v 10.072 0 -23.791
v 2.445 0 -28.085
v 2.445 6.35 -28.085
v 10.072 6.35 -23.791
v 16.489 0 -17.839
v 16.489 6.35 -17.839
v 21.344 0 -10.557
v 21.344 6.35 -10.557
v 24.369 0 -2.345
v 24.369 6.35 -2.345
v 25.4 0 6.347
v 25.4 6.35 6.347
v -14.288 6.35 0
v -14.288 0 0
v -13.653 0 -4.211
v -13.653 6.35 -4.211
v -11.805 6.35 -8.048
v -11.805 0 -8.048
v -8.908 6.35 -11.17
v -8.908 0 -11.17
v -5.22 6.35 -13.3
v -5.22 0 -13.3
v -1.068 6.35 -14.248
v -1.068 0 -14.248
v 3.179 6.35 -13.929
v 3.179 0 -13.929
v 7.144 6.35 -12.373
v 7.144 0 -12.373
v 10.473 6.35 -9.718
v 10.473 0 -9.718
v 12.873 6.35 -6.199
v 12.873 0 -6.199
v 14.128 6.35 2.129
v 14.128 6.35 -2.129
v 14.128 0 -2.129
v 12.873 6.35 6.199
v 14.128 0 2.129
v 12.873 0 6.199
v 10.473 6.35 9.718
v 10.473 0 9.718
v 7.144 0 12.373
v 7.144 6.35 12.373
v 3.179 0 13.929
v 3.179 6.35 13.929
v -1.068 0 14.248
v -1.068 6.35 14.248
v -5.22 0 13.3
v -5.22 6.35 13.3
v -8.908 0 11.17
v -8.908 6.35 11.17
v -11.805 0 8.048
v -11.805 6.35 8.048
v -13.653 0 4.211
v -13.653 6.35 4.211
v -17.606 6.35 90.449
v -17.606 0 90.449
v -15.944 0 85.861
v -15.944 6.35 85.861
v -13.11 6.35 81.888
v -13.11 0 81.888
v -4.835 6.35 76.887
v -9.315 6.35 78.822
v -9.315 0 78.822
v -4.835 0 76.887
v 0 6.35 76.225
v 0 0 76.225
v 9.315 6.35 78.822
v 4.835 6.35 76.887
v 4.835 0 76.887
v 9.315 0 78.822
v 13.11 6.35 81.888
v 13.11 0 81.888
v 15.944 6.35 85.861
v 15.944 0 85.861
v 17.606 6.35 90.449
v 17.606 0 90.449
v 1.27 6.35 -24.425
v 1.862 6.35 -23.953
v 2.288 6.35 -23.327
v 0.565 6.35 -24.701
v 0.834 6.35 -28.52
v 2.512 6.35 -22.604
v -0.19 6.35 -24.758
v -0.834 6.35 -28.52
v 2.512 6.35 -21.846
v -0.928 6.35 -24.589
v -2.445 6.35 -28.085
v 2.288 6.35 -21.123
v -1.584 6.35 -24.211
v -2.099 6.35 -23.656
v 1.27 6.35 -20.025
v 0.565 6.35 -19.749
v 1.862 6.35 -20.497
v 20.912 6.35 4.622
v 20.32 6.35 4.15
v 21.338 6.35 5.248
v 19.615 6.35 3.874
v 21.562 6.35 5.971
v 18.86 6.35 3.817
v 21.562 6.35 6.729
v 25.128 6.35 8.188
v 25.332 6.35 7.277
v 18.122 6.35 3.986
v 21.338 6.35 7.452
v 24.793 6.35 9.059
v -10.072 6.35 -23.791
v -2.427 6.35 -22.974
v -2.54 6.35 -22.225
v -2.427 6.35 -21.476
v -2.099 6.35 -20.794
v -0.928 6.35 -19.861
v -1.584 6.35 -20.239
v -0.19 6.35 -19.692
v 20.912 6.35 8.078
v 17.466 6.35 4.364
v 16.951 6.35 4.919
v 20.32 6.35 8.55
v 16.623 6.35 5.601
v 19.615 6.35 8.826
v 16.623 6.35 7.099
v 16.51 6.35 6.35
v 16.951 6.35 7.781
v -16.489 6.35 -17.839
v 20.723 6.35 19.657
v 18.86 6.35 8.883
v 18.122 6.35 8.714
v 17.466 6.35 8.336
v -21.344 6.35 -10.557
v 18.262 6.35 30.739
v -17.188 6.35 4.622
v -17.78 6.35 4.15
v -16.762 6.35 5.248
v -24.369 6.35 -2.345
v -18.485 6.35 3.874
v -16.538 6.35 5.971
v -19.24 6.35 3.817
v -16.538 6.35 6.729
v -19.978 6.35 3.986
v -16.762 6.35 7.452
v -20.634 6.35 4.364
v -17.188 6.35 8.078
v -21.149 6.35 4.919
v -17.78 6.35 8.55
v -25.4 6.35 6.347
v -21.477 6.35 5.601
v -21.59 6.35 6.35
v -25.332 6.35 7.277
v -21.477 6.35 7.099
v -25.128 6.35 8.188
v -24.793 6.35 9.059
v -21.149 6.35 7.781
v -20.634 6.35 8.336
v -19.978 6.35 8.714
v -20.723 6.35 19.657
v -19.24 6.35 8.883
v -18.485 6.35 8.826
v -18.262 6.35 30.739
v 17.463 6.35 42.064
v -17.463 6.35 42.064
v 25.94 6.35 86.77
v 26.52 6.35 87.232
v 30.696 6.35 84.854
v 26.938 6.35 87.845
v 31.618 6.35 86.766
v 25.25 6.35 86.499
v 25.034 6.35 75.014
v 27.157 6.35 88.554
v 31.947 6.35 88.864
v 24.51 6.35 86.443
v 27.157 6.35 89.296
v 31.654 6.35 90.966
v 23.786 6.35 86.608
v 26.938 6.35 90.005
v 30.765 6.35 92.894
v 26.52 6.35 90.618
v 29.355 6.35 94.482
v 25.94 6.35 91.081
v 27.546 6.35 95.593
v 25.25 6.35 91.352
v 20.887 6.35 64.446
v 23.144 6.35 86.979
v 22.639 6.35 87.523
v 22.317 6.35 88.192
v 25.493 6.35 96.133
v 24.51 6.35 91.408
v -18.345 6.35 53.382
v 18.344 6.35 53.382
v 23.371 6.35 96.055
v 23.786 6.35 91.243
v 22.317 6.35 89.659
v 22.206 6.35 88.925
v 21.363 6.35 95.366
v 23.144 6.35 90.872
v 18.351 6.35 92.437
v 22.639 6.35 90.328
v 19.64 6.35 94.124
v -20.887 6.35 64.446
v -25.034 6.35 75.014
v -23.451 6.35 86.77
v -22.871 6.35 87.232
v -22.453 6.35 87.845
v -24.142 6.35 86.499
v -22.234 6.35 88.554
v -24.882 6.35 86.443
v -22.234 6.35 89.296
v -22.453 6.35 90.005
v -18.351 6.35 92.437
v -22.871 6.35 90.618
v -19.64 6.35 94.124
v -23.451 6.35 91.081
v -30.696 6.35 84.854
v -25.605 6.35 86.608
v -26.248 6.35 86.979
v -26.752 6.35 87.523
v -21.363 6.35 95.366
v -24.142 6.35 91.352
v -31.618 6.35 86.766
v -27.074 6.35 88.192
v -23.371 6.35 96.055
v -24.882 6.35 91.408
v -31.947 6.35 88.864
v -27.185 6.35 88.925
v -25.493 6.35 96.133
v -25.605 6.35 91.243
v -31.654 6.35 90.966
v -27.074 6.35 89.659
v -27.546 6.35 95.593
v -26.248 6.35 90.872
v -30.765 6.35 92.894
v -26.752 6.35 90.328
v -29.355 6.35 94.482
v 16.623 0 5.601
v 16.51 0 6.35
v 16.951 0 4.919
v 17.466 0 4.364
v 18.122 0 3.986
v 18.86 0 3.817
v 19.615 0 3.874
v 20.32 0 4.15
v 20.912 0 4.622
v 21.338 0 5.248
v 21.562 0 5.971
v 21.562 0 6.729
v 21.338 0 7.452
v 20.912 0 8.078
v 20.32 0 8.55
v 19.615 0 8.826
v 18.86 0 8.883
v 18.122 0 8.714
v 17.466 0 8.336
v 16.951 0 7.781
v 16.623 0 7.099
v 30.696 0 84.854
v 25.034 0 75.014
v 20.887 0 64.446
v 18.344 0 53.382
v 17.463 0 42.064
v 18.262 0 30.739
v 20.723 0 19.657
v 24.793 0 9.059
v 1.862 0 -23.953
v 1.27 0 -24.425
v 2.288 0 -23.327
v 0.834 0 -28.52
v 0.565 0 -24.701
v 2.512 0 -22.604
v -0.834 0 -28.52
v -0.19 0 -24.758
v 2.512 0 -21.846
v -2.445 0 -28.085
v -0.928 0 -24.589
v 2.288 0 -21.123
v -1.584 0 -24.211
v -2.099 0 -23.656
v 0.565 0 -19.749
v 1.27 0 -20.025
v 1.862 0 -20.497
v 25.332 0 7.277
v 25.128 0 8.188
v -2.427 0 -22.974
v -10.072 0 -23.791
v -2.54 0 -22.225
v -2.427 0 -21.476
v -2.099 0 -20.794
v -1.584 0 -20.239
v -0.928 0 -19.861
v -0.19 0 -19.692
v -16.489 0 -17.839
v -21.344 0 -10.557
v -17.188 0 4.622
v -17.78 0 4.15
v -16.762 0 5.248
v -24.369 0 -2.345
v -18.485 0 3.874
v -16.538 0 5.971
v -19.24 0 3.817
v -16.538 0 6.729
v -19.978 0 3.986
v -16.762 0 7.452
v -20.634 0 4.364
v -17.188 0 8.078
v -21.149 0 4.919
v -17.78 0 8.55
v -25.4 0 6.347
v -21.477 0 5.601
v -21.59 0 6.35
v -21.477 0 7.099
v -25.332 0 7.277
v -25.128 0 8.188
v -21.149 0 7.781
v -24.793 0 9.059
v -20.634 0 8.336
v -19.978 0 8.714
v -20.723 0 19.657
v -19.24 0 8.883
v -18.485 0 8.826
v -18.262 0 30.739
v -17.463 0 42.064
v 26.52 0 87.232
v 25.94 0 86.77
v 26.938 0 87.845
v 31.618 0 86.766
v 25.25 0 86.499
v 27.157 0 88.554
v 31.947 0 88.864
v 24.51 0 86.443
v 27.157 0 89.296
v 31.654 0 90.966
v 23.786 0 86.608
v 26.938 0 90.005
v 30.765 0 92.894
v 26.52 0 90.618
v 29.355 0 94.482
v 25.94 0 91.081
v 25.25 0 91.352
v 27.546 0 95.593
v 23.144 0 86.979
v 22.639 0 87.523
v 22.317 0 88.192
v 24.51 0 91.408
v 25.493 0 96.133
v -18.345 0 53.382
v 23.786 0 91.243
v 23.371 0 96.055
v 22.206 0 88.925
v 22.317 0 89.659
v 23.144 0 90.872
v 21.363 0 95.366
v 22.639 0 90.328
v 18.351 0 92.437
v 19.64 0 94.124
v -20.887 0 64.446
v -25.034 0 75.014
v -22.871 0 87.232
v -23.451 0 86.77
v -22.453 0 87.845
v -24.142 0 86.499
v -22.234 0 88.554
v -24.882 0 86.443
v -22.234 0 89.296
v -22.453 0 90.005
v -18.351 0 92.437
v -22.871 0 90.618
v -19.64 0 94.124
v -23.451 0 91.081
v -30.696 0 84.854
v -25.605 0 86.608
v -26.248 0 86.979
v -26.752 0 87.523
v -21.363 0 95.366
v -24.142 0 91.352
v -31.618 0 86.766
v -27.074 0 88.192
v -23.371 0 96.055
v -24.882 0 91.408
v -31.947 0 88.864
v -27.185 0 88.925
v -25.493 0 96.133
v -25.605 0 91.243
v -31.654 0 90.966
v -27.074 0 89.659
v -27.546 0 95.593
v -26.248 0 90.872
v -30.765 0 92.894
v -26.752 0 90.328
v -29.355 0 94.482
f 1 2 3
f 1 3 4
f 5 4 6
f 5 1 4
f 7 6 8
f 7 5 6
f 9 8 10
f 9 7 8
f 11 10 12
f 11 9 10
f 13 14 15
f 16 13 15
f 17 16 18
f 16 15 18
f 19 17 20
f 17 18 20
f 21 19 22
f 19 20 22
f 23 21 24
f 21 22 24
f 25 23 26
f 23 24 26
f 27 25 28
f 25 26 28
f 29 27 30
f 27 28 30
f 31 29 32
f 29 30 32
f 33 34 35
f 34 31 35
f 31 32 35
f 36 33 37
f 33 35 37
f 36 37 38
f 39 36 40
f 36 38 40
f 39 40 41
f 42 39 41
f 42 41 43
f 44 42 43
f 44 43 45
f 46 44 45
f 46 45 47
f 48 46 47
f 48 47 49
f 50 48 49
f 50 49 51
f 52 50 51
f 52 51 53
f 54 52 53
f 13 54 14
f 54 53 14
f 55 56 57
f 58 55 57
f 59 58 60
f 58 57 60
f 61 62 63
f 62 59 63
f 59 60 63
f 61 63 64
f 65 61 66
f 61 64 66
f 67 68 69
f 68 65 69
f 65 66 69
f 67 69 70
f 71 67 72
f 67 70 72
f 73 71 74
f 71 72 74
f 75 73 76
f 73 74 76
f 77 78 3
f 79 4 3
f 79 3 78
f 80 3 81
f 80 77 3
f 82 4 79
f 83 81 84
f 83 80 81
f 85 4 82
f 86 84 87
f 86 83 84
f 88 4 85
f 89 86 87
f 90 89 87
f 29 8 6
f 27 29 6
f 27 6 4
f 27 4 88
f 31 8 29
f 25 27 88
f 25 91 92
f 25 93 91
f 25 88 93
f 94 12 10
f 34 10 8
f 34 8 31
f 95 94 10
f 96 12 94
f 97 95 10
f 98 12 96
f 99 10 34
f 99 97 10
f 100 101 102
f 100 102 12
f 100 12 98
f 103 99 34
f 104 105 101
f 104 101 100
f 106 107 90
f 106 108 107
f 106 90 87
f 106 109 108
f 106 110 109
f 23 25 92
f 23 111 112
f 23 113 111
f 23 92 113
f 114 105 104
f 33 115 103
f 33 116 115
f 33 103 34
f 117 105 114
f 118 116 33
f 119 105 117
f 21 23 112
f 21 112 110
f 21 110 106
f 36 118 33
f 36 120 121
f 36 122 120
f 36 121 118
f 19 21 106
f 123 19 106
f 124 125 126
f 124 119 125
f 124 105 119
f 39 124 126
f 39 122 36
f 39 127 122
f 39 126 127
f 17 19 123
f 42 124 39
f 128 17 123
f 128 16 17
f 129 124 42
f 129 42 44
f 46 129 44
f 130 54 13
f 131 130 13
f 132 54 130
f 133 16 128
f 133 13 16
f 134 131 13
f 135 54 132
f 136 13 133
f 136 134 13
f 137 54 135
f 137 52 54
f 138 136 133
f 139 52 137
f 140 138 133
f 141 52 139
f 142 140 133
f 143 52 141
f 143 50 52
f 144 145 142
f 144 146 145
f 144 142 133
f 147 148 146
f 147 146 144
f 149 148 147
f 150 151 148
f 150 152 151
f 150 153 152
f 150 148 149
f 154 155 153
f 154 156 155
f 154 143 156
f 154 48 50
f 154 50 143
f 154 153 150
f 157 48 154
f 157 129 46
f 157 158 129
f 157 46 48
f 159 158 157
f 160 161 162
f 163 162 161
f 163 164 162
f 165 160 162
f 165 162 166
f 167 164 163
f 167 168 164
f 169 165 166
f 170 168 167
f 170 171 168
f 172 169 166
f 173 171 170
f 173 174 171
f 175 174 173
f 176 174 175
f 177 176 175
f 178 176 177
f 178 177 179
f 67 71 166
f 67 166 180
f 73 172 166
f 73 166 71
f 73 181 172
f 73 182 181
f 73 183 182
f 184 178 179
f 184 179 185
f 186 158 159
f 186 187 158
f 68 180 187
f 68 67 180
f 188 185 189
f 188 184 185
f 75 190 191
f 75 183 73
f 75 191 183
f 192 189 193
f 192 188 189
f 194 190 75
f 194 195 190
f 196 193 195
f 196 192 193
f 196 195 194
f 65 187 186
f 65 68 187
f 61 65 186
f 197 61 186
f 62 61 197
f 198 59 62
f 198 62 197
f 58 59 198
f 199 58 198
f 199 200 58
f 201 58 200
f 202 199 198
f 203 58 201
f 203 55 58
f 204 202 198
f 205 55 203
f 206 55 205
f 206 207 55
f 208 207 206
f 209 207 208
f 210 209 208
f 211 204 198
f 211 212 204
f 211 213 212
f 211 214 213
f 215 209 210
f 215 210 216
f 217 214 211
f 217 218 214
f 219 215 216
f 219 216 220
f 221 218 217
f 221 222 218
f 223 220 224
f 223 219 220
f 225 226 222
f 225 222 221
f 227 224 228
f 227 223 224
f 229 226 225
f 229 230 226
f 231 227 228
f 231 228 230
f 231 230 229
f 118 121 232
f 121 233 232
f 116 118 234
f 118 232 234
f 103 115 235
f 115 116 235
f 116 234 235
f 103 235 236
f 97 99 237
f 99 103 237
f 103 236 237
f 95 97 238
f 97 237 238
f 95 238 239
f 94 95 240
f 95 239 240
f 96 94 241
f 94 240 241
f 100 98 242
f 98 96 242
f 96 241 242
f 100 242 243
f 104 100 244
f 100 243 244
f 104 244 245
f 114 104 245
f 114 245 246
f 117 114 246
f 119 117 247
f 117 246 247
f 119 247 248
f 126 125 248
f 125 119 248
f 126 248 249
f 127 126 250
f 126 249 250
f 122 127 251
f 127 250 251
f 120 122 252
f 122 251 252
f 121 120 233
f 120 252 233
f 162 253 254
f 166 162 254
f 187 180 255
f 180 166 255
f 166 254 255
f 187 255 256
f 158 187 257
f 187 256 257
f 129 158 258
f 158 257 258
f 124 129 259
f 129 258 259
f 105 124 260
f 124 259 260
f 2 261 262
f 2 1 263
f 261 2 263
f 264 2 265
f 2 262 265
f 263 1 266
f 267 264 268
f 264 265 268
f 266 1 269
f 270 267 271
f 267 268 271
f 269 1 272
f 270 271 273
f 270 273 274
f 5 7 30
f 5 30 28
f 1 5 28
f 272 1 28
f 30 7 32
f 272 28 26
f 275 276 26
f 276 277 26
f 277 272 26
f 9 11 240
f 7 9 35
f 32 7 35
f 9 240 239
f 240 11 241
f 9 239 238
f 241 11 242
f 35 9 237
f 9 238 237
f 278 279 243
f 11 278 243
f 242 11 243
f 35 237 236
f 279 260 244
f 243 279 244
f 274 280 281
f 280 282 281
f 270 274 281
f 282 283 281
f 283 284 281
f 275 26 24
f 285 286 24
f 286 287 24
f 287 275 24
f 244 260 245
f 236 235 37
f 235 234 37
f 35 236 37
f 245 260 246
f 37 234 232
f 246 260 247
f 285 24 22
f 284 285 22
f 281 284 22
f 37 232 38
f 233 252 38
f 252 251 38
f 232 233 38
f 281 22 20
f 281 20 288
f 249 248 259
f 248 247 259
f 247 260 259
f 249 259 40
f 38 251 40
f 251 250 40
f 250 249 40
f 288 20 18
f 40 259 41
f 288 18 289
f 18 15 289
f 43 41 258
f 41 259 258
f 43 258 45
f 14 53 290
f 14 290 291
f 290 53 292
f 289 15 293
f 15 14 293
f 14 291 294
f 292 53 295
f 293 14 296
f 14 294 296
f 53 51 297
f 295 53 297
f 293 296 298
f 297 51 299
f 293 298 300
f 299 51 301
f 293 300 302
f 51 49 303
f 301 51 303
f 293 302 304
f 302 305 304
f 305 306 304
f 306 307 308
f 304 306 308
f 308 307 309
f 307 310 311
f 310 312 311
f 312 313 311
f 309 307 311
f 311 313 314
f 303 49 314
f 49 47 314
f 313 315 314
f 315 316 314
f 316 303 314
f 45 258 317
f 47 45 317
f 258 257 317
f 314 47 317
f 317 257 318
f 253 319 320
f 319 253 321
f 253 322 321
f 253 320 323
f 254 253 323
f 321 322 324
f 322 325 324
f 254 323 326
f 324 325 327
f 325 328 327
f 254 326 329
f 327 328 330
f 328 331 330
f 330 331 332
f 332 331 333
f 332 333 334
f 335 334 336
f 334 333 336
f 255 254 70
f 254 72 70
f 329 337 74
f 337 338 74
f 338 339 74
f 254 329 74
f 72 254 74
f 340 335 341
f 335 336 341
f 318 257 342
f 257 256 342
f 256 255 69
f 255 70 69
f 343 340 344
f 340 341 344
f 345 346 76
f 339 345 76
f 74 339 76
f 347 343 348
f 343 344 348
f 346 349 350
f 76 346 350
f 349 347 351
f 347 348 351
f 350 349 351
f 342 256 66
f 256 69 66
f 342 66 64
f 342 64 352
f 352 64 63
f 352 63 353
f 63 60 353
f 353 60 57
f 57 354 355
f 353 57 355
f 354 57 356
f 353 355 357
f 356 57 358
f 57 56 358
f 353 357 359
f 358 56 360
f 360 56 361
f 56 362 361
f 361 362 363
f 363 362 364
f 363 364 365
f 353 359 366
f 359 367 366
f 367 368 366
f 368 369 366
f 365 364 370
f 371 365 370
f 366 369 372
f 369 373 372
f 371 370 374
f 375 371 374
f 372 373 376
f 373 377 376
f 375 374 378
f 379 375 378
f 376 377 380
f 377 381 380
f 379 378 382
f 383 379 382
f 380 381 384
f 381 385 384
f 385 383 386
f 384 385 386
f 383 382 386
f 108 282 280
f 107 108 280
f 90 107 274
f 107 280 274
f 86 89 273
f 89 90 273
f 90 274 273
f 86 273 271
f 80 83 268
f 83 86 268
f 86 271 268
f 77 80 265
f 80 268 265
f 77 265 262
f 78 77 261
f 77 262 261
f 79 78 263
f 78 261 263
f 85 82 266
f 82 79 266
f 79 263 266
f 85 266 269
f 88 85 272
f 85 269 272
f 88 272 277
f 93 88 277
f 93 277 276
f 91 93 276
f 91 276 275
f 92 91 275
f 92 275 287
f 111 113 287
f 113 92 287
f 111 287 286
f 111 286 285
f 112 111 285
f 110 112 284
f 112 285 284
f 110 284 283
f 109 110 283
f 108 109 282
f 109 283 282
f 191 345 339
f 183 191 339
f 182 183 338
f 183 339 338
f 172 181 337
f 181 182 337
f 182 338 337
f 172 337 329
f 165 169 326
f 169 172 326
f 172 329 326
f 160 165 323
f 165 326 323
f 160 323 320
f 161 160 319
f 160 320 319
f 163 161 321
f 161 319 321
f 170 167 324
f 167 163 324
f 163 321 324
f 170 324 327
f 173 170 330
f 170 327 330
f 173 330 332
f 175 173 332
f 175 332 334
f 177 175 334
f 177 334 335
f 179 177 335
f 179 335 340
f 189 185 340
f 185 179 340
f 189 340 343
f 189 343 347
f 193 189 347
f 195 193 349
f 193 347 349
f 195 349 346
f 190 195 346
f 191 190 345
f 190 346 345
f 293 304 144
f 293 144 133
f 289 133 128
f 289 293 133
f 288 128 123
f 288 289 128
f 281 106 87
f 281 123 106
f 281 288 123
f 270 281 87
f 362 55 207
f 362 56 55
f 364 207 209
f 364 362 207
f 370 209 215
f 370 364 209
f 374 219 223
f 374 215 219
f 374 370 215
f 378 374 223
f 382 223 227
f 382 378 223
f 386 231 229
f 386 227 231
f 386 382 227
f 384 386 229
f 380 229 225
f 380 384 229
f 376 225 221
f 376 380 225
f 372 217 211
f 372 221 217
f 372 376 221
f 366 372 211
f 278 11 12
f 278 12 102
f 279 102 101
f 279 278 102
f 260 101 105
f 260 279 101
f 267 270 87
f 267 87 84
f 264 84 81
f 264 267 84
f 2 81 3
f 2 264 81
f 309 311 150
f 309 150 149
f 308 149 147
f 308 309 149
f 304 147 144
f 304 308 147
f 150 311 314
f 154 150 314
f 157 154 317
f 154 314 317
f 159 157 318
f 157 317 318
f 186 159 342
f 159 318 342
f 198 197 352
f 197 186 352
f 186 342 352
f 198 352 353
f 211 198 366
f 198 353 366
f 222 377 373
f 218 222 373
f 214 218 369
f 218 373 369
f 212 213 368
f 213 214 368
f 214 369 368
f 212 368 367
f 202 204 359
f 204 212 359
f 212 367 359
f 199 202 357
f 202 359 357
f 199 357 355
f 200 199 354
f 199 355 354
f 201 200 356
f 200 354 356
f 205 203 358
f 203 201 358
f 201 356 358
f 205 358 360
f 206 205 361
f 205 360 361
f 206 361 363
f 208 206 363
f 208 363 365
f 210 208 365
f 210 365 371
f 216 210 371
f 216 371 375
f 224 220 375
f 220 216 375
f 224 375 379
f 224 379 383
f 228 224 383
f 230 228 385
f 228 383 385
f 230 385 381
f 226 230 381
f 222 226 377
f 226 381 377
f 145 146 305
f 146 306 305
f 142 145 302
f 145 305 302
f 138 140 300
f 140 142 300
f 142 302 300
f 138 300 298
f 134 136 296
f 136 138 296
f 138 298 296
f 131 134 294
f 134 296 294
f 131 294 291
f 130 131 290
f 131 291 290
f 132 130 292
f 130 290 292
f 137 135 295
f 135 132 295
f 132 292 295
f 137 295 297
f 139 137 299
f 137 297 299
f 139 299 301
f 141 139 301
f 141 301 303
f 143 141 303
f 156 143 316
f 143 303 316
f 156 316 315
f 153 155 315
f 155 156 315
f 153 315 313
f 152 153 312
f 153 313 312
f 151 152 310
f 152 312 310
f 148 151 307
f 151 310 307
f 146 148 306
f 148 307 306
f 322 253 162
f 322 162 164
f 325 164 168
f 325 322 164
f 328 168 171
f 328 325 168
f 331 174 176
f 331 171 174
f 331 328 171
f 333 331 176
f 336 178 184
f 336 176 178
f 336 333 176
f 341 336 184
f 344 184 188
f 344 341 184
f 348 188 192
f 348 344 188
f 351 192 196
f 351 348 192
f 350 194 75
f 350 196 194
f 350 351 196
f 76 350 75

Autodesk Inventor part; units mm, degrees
ref_plane "YZ Plane" through (0, 0, 0) normal (1, 0, 0) x (0, 1, 0)
ref_plane "XZ Plane" through (0, 0, 0) normal (0, 1, 0) x (-1, 0, 0)
ref_plane "XY Plane" through (0, 0, 0) normal (0, 0, 1) x (1, 0, 0)
sketch "Sketch1" plane through (0, 0, 0) normal (0, 1, 0) x (-1, 0, 0)
  circle A0 centre (0, 0) radius 14.2875
  line L0 (143.7805, 15.875) -> (-143.7805, 15.875) construction
  line L1 (0, 0) -> (0, 15.875) construction
  line L2 (0, 15.875) -> (0, 88.9254) construction
  line L3 (24.6957, 88.9254) -> (-24.6957, 88.9254) construction
  line L4 (0, 113.6211) -> (0, 64.2297) construction
  circle A1 centre (24.6957, 88.9254) radius 2.4892
  circle A2 centre (-24.6957, 88.9254) radius 2.4892
  circle A3 centre (0, 64.2297) radius 2.4892 construction
  circle A4 centre (0, 113.6211) radius 2.4892 construction
  circle A5 centre (0, 0) radius 50.8 construction
  line L5 (143.7805, -34.925) -> (-143.7805, -34.925) construction
  line L6 (0, 0) -> (0, -34.925) construction
  circle A6 centre (19.05, 6.35) radius 2.54
  circle A7 centre (-19.05, 6.35) radius 2.54
  circle A8 centre (0, -22.225) radius 2.54
  line L7 (19.05, 6.35) -> (-19.05, 6.35) construction
  arc A9 (-2.4454, -28.0852) -> (2.4454, -28.0852) centre (0, -22.225) ccw
  arc A10 (-24.7931, 9.059) -> (-25.4, 6.3466) centre (-19.05, 6.35) ccw
  arc A11 (25.4, 6.3466) -> (24.7931, 9.059) centre (19.05, 6.35) ccw
  arc A12 (30.6963, 84.8535) -> (24.7931, 9.059) centre (94.1678, 41.783) ccw
  arc A13 (-24.7931, 9.059) -> (-30.6963, 84.8535) centre (-94.1678, 41.783) ccw
  arc A14 (2.4454, -28.0852) -> (25.4, 6.3466) centre (-11.9308, 6.3664) ccw
  arc A15 (-25.4, 6.3466) -> (-2.4454, -28.0852) centre (11.9308, 6.3664) ccw
  line L8 (12.3733, -7.1438) -> (20.6222, -11.9063) construction
  arc A16 (-17.6059, 90.4493) -> (-30.6963, 84.8535) centre (-24.6957, 88.9254) ccw
  arc A17 (30.6963, 84.8535) -> (17.6059, 90.4493) centre (24.6957, 88.9254) ccw
  arc A18 (-17.6059, 90.4493) -> (17.6059, 90.4493) centre (0, 94.2334) ccw
  line L9 (-17.4625, 41.783) -> (17.4625, 41.783) construction
  circle A19 centre (0, 88.9254) radius 12.7 construction
  point P0 (0, 6.35)
  dimension "d0" = 28.575
  dimension "d1" = 15.875
  dimension "d3" = 4.9784
  dimension "d4" = 88.9254
  dimension "d5" = 101.6
  dimension "d7" = 50.8
  dimension "d8" = 5.08
  dimension "d9" = 9.525
  dimension "d10" = 38.1
  dimension "d12" = 6.35
  dimension "d18" = 28.575
  dimension "d19" = 9.525
  dimension "d20" = 60
  dimension "d23" = 34.925
  dimension "d25" = 4.7625
  dimension "d26" = 34.925
  dimension "d27" = 25.4
extrude "Extrusion1" add sketch "Sketch1" along normal blind 6.35
properties material "Aluminum 6061"
